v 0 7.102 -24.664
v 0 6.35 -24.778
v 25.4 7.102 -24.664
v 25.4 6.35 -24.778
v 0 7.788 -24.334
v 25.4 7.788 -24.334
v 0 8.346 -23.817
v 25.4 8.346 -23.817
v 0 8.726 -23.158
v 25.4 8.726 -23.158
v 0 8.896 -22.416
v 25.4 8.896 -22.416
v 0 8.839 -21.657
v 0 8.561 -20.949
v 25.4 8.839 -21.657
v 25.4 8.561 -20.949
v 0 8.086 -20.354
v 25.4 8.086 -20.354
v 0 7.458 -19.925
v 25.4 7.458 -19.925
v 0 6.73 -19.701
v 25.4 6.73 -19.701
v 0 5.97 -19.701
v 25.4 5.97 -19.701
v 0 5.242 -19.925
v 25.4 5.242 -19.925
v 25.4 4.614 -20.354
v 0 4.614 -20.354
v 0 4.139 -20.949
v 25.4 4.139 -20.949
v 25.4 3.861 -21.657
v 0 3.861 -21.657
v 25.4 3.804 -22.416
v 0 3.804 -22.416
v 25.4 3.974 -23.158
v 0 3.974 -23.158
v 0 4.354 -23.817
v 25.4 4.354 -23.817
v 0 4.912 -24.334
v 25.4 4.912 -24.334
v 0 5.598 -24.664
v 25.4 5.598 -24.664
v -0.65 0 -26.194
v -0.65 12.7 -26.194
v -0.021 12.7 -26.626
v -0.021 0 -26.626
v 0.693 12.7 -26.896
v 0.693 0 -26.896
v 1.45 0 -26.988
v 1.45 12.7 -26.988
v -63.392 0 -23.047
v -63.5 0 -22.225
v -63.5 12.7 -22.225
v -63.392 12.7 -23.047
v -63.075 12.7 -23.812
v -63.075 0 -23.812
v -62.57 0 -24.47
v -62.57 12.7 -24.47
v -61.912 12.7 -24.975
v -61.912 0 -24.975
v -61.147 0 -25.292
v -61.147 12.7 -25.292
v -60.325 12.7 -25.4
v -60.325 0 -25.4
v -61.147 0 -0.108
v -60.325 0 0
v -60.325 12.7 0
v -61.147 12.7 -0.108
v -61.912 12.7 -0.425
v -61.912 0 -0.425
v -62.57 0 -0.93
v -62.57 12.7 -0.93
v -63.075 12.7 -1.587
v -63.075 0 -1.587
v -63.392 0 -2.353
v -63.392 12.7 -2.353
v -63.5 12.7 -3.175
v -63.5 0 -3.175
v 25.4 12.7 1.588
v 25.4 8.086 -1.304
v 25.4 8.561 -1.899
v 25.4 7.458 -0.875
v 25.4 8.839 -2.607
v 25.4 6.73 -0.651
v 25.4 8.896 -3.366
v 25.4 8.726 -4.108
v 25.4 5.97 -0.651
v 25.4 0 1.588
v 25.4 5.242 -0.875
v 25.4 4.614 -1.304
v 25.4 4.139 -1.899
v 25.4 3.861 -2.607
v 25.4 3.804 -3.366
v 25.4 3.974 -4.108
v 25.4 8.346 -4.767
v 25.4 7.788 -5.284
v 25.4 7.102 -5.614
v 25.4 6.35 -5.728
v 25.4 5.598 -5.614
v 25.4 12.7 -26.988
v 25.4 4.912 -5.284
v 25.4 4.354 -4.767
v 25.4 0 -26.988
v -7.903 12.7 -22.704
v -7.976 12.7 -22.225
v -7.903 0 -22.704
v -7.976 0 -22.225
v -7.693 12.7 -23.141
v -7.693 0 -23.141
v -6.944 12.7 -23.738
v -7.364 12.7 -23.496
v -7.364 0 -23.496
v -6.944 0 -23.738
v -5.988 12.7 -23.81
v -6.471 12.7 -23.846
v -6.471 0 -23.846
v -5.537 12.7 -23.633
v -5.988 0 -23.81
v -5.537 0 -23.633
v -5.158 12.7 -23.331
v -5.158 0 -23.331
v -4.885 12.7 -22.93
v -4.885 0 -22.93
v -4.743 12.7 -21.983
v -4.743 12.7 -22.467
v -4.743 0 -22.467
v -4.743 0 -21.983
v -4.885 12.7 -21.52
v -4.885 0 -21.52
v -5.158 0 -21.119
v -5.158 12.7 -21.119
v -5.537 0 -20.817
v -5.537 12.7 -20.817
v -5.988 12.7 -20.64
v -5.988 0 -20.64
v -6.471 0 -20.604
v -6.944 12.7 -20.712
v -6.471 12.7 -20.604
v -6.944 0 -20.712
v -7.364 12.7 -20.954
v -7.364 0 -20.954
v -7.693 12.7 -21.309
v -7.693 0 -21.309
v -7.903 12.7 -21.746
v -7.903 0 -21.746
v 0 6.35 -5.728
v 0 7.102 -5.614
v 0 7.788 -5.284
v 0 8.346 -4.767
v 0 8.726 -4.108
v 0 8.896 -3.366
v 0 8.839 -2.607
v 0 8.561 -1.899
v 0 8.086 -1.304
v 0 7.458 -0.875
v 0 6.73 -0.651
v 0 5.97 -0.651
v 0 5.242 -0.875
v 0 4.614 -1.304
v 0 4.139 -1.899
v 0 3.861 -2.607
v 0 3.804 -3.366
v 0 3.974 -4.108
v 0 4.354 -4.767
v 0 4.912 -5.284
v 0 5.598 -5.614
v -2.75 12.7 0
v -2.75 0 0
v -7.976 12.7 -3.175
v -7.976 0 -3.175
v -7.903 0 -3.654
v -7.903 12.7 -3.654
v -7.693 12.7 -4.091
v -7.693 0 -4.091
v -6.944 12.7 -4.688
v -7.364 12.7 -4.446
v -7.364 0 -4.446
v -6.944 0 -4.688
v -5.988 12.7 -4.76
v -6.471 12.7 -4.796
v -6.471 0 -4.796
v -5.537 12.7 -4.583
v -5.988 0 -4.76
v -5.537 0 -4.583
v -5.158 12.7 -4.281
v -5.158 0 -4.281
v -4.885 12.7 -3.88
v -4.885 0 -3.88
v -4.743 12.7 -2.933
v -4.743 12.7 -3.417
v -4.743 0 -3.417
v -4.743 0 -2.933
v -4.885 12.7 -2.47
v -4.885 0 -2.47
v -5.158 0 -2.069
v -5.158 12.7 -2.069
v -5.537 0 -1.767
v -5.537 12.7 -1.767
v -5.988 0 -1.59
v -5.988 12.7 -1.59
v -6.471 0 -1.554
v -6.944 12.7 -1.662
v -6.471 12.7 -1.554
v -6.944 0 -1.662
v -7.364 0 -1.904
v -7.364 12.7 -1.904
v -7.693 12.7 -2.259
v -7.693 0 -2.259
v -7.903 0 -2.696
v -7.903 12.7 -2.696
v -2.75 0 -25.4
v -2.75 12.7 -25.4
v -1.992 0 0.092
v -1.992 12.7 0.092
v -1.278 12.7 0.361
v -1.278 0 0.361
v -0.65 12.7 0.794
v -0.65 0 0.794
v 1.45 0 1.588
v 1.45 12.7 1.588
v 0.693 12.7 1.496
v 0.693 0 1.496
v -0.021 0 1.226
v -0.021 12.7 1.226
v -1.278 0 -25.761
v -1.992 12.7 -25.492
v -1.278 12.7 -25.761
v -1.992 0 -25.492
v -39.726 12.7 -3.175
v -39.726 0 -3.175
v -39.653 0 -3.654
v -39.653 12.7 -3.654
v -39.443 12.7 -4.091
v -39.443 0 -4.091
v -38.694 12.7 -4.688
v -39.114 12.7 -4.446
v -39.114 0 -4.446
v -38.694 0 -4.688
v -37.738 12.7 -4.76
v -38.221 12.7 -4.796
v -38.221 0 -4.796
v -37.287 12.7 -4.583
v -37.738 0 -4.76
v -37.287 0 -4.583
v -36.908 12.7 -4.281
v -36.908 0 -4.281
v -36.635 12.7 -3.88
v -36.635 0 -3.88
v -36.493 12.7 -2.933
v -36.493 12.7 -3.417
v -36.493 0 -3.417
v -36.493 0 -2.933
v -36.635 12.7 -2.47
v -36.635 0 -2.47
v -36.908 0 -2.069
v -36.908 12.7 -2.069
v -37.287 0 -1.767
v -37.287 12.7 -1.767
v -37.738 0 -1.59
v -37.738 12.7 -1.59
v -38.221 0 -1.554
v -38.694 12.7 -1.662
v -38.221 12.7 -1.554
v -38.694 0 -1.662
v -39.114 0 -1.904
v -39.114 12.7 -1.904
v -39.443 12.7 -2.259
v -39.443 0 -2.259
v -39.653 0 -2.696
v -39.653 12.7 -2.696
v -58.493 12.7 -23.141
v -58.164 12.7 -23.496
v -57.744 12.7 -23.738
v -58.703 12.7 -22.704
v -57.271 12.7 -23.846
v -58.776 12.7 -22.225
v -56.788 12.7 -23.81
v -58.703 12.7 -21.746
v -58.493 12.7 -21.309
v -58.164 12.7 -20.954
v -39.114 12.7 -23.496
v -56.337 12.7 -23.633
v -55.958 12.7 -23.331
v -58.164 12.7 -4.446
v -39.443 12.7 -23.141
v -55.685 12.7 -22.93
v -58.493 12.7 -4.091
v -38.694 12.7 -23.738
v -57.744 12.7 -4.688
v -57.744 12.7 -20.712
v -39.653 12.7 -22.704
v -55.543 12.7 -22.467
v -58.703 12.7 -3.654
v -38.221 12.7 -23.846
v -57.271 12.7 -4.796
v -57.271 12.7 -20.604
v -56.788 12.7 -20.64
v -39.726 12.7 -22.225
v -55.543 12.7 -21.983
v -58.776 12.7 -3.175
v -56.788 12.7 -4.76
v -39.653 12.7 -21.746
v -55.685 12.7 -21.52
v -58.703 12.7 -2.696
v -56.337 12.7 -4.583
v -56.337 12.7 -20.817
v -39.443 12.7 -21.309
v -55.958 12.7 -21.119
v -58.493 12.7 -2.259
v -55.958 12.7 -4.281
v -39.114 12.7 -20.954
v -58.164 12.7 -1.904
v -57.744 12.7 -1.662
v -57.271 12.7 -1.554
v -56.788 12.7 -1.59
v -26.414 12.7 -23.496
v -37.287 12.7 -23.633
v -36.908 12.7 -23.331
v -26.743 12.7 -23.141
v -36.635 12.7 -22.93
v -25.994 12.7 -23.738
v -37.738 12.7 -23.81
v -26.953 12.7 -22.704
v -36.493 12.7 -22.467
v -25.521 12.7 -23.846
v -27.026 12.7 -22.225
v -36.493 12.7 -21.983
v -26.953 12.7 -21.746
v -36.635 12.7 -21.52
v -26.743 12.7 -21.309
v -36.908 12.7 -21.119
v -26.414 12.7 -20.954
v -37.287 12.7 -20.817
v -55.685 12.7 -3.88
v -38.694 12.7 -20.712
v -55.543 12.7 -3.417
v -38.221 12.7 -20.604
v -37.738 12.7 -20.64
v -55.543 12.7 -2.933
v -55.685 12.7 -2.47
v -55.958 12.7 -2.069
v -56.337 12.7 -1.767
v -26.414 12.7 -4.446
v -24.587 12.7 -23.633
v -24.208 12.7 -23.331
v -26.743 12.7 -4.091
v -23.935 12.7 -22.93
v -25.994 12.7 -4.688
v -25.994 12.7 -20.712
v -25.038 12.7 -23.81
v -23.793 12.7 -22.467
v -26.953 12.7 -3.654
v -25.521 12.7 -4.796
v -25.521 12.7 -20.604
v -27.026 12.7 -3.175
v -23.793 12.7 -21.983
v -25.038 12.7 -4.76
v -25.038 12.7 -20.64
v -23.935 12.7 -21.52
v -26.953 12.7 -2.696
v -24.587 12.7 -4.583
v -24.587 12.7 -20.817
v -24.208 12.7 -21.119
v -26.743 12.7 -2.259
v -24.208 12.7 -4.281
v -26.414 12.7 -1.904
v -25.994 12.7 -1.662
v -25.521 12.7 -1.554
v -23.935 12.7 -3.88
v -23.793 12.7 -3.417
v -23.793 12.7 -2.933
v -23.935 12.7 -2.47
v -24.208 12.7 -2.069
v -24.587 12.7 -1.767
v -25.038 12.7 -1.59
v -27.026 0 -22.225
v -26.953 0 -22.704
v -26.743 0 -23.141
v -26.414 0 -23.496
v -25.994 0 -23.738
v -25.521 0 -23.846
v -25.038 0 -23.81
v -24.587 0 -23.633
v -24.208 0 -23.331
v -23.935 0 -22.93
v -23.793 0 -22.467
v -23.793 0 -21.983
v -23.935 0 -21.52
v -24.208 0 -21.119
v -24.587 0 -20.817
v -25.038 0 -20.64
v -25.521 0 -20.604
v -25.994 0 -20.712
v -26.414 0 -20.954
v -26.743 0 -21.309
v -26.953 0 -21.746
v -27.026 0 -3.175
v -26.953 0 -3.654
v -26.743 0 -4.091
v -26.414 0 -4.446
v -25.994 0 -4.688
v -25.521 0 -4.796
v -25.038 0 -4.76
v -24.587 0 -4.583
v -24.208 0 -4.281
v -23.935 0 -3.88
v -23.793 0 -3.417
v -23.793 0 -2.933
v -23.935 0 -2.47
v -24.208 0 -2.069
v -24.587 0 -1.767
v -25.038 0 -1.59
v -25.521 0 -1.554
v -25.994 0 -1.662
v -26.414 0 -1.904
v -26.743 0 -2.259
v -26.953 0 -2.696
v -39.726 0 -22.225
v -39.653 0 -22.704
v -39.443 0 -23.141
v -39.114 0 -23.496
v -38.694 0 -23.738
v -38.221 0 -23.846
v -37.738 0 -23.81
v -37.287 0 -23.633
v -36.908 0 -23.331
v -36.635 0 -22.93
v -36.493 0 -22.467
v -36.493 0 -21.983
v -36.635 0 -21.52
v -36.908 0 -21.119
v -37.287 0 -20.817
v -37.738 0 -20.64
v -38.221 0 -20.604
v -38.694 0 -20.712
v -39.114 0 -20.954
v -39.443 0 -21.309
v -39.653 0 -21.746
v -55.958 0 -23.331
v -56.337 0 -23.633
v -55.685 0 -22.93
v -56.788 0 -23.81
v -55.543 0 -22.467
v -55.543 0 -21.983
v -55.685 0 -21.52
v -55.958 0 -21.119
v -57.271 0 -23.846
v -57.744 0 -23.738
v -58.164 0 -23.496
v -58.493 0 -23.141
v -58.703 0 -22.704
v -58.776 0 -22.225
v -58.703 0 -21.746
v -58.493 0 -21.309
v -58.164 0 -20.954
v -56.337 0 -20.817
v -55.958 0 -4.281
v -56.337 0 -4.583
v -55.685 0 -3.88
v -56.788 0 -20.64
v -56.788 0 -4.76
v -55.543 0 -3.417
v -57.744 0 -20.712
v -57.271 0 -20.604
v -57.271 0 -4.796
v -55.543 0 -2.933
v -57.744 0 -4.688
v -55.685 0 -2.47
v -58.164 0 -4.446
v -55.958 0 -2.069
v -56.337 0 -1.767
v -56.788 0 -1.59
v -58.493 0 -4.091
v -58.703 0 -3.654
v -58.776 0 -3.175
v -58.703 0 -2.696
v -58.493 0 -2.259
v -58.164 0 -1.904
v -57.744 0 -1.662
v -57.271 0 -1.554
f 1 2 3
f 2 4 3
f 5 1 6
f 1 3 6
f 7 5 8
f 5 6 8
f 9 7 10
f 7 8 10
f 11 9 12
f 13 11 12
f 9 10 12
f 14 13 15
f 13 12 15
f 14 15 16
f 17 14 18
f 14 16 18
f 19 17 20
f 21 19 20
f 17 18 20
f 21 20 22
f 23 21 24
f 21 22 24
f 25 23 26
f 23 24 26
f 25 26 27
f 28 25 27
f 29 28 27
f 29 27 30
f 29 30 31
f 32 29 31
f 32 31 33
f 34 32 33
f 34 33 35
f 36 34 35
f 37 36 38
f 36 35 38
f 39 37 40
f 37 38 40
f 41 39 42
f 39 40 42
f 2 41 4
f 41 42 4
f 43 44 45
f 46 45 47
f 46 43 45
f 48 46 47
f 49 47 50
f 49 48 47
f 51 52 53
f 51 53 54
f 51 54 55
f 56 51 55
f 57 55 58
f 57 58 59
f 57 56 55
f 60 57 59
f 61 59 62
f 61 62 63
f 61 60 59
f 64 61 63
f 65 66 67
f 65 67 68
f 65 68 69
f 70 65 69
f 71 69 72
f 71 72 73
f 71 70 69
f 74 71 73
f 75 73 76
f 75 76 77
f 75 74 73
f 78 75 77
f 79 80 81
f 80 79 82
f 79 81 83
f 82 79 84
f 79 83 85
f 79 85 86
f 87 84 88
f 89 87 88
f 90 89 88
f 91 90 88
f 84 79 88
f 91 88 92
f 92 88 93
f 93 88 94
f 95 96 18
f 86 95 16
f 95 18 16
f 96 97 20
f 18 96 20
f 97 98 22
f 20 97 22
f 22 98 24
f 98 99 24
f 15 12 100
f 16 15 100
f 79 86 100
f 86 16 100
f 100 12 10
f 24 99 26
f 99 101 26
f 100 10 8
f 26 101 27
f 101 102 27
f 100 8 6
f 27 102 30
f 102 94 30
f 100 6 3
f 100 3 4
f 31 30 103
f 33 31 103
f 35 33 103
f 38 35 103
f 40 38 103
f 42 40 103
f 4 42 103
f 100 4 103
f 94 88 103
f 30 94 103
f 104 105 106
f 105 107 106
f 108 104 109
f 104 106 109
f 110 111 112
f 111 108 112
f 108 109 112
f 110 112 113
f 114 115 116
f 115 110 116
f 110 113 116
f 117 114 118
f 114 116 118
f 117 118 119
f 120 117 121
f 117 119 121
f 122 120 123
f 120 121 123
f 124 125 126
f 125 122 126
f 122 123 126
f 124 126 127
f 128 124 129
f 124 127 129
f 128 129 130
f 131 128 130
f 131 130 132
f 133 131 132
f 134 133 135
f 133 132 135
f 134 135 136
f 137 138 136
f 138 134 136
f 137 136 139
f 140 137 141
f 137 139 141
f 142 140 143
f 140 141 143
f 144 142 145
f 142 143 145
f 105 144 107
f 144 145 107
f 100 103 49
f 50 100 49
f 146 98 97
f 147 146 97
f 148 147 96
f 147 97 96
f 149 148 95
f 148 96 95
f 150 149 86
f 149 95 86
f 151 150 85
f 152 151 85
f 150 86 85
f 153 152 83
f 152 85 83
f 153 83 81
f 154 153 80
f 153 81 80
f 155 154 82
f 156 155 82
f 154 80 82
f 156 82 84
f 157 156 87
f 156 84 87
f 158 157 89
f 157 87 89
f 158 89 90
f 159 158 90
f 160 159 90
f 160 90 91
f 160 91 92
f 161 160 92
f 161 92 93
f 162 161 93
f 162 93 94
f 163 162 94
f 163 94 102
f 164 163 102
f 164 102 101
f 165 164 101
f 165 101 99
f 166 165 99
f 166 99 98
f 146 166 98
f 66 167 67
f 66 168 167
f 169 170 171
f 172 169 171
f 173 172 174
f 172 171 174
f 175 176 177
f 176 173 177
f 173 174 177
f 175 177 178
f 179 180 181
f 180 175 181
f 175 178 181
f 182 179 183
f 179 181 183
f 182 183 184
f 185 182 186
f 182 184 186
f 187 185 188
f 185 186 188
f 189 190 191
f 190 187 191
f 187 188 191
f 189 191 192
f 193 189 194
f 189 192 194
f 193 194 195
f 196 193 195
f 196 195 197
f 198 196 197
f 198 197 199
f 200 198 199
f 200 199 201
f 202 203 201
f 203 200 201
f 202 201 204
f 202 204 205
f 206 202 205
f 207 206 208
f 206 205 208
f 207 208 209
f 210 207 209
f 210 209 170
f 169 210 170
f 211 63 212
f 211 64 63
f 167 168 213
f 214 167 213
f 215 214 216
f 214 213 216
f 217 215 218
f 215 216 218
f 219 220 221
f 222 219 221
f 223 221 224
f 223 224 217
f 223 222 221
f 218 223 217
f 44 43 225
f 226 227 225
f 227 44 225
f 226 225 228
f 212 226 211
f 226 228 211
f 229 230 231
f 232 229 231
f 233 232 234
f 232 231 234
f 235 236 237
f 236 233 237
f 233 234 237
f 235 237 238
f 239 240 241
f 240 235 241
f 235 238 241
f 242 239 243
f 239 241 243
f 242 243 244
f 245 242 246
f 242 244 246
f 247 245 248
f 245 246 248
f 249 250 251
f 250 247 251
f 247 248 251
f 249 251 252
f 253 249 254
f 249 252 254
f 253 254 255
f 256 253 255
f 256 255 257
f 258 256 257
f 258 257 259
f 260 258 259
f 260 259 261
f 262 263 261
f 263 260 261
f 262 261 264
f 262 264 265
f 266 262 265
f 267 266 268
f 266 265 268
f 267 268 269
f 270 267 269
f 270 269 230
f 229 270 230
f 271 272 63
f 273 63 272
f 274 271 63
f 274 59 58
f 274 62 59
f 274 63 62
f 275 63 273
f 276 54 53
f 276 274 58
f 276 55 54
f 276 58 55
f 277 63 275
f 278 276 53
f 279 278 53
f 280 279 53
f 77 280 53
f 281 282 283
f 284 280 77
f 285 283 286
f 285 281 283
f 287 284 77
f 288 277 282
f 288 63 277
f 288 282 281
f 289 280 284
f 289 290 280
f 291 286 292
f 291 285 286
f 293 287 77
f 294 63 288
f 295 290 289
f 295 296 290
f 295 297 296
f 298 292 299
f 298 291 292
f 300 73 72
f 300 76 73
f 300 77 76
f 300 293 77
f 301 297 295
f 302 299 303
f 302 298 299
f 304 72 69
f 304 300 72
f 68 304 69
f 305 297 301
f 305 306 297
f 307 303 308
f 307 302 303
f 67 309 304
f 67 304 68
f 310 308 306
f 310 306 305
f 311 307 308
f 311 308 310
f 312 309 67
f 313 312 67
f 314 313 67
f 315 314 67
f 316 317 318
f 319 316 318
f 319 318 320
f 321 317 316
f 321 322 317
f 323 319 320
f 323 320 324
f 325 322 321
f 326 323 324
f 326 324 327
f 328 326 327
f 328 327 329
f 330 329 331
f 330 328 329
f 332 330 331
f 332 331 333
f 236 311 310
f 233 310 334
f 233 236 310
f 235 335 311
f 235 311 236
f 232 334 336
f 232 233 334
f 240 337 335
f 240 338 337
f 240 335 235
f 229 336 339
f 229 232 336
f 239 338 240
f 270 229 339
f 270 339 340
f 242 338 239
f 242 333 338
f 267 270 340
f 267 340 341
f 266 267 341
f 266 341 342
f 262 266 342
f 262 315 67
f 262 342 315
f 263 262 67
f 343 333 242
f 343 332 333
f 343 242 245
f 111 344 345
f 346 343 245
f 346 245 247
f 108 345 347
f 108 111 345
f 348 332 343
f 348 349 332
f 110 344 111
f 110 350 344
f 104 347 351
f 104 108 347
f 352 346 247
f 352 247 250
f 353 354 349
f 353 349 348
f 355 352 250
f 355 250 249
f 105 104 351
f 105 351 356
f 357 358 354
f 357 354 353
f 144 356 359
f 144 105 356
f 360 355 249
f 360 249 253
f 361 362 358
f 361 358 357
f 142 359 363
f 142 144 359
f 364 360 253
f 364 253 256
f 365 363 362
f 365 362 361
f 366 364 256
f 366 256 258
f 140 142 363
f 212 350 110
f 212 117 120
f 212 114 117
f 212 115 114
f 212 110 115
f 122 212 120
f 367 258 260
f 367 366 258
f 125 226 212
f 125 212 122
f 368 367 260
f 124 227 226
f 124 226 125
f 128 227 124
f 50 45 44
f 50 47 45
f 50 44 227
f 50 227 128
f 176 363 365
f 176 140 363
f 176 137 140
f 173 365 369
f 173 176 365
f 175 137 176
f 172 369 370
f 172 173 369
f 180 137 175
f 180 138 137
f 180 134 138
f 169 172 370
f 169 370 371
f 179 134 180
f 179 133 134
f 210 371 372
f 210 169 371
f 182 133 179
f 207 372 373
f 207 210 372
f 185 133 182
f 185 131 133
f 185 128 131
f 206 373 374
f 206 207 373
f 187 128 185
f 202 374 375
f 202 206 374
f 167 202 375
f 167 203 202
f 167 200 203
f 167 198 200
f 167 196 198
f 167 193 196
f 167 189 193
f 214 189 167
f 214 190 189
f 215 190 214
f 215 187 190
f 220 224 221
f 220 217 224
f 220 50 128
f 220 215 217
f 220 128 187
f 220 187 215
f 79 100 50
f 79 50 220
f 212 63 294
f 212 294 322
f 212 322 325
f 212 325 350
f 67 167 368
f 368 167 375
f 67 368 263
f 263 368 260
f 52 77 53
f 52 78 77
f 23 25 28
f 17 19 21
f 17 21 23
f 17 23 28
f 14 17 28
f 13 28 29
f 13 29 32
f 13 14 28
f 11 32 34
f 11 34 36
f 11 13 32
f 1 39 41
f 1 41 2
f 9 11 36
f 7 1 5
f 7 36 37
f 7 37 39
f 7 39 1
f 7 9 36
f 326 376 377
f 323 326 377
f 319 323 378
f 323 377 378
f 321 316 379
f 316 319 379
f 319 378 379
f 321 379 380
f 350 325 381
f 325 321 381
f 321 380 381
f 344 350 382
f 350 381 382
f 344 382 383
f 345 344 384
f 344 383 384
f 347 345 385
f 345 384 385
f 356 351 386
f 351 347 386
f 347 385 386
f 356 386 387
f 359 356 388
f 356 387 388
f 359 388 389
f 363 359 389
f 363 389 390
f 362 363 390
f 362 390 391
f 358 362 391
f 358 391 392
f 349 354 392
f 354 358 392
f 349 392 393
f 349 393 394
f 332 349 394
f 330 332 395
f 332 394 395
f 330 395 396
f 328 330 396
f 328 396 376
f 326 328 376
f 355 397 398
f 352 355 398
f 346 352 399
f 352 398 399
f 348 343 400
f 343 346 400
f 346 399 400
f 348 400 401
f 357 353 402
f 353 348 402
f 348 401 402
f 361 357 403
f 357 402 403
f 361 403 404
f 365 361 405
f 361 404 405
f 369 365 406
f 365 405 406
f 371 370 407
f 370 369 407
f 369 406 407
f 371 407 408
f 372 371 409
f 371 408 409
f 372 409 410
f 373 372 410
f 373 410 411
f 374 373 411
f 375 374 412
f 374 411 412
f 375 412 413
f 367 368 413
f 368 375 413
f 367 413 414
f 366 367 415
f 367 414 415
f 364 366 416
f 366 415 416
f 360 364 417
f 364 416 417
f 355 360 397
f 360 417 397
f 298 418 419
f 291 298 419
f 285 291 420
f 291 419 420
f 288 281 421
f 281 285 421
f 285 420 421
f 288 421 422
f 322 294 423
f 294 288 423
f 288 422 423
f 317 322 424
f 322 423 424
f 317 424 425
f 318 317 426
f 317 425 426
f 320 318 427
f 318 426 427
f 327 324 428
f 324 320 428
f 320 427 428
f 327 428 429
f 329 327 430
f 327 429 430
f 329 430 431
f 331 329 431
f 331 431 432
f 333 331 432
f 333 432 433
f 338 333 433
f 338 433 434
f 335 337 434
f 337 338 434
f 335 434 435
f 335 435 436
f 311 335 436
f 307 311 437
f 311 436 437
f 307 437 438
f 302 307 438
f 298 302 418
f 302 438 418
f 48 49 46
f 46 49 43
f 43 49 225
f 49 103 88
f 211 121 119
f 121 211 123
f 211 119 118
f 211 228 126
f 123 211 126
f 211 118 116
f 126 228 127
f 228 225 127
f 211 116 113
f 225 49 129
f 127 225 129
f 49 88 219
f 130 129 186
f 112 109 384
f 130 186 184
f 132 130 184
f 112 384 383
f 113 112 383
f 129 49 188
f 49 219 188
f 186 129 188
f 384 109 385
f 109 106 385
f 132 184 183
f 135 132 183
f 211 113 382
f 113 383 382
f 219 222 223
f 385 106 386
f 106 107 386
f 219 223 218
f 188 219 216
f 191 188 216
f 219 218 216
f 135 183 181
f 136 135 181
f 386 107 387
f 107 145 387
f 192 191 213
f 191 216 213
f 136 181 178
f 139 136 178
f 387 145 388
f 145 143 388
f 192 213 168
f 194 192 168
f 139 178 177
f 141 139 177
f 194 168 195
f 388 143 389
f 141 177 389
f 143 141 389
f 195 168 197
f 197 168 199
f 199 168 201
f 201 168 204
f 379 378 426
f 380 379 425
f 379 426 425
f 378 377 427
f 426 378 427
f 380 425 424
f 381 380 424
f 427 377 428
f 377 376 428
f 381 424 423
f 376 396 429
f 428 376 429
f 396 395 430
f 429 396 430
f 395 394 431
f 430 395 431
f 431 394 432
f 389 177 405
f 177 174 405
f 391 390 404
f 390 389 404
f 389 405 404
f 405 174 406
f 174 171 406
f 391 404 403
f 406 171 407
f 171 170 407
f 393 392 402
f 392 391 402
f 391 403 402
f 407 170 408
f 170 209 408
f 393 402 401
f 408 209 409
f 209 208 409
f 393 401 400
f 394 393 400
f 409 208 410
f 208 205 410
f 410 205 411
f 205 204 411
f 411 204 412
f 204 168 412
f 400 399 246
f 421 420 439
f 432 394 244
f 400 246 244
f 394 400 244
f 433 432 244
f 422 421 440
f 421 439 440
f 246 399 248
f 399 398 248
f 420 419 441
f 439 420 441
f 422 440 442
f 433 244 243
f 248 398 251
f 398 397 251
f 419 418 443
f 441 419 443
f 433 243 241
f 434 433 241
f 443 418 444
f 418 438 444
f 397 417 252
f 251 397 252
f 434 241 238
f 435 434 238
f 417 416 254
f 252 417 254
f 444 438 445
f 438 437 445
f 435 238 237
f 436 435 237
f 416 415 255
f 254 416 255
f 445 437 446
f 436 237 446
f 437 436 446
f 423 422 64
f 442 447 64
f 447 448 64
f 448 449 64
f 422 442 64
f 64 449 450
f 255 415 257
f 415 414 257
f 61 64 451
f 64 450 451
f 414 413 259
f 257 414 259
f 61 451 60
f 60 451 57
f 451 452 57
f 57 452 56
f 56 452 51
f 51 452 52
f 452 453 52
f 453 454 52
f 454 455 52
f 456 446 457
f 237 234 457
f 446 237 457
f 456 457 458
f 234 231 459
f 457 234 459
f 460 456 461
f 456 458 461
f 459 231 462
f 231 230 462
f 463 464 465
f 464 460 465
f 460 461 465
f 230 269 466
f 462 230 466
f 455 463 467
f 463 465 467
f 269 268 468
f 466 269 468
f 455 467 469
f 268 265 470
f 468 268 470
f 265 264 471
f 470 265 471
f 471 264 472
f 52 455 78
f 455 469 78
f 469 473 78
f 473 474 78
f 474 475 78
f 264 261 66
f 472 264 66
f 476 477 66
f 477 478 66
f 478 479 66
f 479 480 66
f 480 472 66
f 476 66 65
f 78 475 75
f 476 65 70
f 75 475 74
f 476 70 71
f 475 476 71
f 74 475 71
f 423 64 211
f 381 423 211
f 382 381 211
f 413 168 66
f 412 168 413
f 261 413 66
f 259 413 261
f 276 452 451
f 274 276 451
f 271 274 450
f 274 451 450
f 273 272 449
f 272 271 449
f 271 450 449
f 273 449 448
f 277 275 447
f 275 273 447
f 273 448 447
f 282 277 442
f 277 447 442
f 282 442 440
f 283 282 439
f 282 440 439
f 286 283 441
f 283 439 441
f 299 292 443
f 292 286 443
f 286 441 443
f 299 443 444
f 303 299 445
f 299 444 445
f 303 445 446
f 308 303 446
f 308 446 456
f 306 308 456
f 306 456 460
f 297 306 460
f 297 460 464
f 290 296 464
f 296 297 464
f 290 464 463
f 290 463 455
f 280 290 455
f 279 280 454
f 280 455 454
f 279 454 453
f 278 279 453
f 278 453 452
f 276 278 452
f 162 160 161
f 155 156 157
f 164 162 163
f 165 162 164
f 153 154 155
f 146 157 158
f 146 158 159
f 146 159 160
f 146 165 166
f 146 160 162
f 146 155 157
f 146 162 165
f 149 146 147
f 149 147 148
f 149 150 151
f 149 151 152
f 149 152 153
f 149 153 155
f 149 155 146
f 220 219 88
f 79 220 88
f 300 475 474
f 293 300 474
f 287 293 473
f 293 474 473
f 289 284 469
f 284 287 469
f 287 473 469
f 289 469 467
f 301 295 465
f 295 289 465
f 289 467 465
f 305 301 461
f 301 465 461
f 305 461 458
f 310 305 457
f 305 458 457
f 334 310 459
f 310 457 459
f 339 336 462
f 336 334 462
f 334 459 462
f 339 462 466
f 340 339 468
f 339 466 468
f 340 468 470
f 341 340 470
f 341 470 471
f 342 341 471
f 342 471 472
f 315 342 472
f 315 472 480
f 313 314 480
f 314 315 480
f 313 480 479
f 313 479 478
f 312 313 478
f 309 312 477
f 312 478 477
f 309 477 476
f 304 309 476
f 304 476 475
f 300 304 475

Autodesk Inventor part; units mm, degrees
ref_plane "YZ Plane" through (0, 0, 0) normal (1, 0, 0) x (0, 1, 0)
ref_plane "XZ Plane" through (0, 0, 0) normal (0, 1, 0) x (-1, 0, 0)
ref_plane "XY Plane" through (0, 0, 0) normal (0, 0, 1) x (1, 0, 0)
sketch "Sketch1" plane through (0, 0, 0) normal (0, 1, 0) x (-1, 0, 0)
  line L0 (0, 0) -> (63.5, 0)
  line L1 (63.5, 0) -> (63.5, -25.4)
  line L2 (63.5, -25.4) -> (0, -25.4)
  line L3 (0, -25.4) -> (0, 0) construction
  line L4 (0, 1.5875) -> (-25.4, 1.5875)
  line L5 (-25.4, 1.5875) -> (-25.4, -26.9875)
  line L6 (-25.4, -26.9875) -> (0, -26.9875)
  line L7 (0, -26.9875) -> (0, 1.5875)
  circle A0 centre (6.35, -3.175) radius 1.6256
  circle A1 centre (25.4, -3.175) radius 1.6256
  circle A2 centre (6.35, -22.225) radius 1.6256
  circle A3 centre (25.4, -22.225) radius 1.6256
  circle A4 centre (57.15, -3.175) radius 1.6256
  circle A5 centre (57.15, -22.225) radius 1.6256
  circle A6 centre (38.1, -3.175) radius 1.6256
  circle A7 centre (38.1, -22.225) radius 1.6256
  point P0 (0, -12.7)
  point P1 (0, -12.7)
  point P2 (-12.7, 1.5875)
  point P3 (-12.7, -26.9875)
  point P4 (0, -25.4)
  dimension "d0" = 25.4
  dimension "d11" = 63.5
  dimension "d12" = 25.4
  dimension "d20" = 3.2512
  dimension "d23" = 19.05
  dimension "d26" = 19.05
  dimension "d29" = 3.2512
  dimension "d32" = 19.05
  dimension "d35" = 19.05
  dimension "d38" = 12.7
  dimension "d39" = 6.35
  dimension "d40" = 3.175
  dimension "d41" = 28.575
extrude "Extrusion1" add sketch "Sketch1" along normal blind 12.7
fillet "Fillet1" radius 3.175 6 edges at (-63.5, 6.35, -25.4) (-63.5, 6.35, 0) (0, 6.35, -25.4) (0, 6.35, -26.9875) (0, 6.35, 0) (0, 6.35, 1.5875)
sketch "Sketch2" plane through (25.4, 0, 1.5875) normal (1, 0, 0) x (0, 0, -1)
  line L0 (0, 12.7) -> (28.575, 12.7)
  line L1 (28.575, 12.7) -> (28.575, 0)
  line L2 (28.575, 0) -> (0, 0)
  line L3 (0, 0) -> (0, 12.7)
  line L4 (0, 12.7) -> (28.575, 0) construction
  line L5 (28.575, 12.7) -> (0, 0) construction
  line L6 (0, 12.7) -> (28.575, 12.7) projected
  line L7 (0, 0) -> (0, 12.7) projected
  circle A0 centre (23.8125, 6.35) radius 2.5527
  circle A1 centre (4.7625, 6.35) radius 2.5527
  point P0 (1.5875, 0)
  point P1 (14.2875, 6.35)
  dimension "d45" = 5.1054
  dimension "d46" = 9.525
  dimension "d47" = 9.525
extrude "Extrusion2" cut sketch "Sketch2" against normal blind 25.4 contours A0 | A1
thread "Thread1" size "1/4-20 UNC" class "2B" standard "ANSI Unified Screw Threads" full length
thread "Thread2" size "1/4-20 UNC" class "2B" standard "ANSI Unified Screw Threads" full length
properties part number "DVBS_009_RemoteLookingBracket" material "Polyethylene, High Density"
